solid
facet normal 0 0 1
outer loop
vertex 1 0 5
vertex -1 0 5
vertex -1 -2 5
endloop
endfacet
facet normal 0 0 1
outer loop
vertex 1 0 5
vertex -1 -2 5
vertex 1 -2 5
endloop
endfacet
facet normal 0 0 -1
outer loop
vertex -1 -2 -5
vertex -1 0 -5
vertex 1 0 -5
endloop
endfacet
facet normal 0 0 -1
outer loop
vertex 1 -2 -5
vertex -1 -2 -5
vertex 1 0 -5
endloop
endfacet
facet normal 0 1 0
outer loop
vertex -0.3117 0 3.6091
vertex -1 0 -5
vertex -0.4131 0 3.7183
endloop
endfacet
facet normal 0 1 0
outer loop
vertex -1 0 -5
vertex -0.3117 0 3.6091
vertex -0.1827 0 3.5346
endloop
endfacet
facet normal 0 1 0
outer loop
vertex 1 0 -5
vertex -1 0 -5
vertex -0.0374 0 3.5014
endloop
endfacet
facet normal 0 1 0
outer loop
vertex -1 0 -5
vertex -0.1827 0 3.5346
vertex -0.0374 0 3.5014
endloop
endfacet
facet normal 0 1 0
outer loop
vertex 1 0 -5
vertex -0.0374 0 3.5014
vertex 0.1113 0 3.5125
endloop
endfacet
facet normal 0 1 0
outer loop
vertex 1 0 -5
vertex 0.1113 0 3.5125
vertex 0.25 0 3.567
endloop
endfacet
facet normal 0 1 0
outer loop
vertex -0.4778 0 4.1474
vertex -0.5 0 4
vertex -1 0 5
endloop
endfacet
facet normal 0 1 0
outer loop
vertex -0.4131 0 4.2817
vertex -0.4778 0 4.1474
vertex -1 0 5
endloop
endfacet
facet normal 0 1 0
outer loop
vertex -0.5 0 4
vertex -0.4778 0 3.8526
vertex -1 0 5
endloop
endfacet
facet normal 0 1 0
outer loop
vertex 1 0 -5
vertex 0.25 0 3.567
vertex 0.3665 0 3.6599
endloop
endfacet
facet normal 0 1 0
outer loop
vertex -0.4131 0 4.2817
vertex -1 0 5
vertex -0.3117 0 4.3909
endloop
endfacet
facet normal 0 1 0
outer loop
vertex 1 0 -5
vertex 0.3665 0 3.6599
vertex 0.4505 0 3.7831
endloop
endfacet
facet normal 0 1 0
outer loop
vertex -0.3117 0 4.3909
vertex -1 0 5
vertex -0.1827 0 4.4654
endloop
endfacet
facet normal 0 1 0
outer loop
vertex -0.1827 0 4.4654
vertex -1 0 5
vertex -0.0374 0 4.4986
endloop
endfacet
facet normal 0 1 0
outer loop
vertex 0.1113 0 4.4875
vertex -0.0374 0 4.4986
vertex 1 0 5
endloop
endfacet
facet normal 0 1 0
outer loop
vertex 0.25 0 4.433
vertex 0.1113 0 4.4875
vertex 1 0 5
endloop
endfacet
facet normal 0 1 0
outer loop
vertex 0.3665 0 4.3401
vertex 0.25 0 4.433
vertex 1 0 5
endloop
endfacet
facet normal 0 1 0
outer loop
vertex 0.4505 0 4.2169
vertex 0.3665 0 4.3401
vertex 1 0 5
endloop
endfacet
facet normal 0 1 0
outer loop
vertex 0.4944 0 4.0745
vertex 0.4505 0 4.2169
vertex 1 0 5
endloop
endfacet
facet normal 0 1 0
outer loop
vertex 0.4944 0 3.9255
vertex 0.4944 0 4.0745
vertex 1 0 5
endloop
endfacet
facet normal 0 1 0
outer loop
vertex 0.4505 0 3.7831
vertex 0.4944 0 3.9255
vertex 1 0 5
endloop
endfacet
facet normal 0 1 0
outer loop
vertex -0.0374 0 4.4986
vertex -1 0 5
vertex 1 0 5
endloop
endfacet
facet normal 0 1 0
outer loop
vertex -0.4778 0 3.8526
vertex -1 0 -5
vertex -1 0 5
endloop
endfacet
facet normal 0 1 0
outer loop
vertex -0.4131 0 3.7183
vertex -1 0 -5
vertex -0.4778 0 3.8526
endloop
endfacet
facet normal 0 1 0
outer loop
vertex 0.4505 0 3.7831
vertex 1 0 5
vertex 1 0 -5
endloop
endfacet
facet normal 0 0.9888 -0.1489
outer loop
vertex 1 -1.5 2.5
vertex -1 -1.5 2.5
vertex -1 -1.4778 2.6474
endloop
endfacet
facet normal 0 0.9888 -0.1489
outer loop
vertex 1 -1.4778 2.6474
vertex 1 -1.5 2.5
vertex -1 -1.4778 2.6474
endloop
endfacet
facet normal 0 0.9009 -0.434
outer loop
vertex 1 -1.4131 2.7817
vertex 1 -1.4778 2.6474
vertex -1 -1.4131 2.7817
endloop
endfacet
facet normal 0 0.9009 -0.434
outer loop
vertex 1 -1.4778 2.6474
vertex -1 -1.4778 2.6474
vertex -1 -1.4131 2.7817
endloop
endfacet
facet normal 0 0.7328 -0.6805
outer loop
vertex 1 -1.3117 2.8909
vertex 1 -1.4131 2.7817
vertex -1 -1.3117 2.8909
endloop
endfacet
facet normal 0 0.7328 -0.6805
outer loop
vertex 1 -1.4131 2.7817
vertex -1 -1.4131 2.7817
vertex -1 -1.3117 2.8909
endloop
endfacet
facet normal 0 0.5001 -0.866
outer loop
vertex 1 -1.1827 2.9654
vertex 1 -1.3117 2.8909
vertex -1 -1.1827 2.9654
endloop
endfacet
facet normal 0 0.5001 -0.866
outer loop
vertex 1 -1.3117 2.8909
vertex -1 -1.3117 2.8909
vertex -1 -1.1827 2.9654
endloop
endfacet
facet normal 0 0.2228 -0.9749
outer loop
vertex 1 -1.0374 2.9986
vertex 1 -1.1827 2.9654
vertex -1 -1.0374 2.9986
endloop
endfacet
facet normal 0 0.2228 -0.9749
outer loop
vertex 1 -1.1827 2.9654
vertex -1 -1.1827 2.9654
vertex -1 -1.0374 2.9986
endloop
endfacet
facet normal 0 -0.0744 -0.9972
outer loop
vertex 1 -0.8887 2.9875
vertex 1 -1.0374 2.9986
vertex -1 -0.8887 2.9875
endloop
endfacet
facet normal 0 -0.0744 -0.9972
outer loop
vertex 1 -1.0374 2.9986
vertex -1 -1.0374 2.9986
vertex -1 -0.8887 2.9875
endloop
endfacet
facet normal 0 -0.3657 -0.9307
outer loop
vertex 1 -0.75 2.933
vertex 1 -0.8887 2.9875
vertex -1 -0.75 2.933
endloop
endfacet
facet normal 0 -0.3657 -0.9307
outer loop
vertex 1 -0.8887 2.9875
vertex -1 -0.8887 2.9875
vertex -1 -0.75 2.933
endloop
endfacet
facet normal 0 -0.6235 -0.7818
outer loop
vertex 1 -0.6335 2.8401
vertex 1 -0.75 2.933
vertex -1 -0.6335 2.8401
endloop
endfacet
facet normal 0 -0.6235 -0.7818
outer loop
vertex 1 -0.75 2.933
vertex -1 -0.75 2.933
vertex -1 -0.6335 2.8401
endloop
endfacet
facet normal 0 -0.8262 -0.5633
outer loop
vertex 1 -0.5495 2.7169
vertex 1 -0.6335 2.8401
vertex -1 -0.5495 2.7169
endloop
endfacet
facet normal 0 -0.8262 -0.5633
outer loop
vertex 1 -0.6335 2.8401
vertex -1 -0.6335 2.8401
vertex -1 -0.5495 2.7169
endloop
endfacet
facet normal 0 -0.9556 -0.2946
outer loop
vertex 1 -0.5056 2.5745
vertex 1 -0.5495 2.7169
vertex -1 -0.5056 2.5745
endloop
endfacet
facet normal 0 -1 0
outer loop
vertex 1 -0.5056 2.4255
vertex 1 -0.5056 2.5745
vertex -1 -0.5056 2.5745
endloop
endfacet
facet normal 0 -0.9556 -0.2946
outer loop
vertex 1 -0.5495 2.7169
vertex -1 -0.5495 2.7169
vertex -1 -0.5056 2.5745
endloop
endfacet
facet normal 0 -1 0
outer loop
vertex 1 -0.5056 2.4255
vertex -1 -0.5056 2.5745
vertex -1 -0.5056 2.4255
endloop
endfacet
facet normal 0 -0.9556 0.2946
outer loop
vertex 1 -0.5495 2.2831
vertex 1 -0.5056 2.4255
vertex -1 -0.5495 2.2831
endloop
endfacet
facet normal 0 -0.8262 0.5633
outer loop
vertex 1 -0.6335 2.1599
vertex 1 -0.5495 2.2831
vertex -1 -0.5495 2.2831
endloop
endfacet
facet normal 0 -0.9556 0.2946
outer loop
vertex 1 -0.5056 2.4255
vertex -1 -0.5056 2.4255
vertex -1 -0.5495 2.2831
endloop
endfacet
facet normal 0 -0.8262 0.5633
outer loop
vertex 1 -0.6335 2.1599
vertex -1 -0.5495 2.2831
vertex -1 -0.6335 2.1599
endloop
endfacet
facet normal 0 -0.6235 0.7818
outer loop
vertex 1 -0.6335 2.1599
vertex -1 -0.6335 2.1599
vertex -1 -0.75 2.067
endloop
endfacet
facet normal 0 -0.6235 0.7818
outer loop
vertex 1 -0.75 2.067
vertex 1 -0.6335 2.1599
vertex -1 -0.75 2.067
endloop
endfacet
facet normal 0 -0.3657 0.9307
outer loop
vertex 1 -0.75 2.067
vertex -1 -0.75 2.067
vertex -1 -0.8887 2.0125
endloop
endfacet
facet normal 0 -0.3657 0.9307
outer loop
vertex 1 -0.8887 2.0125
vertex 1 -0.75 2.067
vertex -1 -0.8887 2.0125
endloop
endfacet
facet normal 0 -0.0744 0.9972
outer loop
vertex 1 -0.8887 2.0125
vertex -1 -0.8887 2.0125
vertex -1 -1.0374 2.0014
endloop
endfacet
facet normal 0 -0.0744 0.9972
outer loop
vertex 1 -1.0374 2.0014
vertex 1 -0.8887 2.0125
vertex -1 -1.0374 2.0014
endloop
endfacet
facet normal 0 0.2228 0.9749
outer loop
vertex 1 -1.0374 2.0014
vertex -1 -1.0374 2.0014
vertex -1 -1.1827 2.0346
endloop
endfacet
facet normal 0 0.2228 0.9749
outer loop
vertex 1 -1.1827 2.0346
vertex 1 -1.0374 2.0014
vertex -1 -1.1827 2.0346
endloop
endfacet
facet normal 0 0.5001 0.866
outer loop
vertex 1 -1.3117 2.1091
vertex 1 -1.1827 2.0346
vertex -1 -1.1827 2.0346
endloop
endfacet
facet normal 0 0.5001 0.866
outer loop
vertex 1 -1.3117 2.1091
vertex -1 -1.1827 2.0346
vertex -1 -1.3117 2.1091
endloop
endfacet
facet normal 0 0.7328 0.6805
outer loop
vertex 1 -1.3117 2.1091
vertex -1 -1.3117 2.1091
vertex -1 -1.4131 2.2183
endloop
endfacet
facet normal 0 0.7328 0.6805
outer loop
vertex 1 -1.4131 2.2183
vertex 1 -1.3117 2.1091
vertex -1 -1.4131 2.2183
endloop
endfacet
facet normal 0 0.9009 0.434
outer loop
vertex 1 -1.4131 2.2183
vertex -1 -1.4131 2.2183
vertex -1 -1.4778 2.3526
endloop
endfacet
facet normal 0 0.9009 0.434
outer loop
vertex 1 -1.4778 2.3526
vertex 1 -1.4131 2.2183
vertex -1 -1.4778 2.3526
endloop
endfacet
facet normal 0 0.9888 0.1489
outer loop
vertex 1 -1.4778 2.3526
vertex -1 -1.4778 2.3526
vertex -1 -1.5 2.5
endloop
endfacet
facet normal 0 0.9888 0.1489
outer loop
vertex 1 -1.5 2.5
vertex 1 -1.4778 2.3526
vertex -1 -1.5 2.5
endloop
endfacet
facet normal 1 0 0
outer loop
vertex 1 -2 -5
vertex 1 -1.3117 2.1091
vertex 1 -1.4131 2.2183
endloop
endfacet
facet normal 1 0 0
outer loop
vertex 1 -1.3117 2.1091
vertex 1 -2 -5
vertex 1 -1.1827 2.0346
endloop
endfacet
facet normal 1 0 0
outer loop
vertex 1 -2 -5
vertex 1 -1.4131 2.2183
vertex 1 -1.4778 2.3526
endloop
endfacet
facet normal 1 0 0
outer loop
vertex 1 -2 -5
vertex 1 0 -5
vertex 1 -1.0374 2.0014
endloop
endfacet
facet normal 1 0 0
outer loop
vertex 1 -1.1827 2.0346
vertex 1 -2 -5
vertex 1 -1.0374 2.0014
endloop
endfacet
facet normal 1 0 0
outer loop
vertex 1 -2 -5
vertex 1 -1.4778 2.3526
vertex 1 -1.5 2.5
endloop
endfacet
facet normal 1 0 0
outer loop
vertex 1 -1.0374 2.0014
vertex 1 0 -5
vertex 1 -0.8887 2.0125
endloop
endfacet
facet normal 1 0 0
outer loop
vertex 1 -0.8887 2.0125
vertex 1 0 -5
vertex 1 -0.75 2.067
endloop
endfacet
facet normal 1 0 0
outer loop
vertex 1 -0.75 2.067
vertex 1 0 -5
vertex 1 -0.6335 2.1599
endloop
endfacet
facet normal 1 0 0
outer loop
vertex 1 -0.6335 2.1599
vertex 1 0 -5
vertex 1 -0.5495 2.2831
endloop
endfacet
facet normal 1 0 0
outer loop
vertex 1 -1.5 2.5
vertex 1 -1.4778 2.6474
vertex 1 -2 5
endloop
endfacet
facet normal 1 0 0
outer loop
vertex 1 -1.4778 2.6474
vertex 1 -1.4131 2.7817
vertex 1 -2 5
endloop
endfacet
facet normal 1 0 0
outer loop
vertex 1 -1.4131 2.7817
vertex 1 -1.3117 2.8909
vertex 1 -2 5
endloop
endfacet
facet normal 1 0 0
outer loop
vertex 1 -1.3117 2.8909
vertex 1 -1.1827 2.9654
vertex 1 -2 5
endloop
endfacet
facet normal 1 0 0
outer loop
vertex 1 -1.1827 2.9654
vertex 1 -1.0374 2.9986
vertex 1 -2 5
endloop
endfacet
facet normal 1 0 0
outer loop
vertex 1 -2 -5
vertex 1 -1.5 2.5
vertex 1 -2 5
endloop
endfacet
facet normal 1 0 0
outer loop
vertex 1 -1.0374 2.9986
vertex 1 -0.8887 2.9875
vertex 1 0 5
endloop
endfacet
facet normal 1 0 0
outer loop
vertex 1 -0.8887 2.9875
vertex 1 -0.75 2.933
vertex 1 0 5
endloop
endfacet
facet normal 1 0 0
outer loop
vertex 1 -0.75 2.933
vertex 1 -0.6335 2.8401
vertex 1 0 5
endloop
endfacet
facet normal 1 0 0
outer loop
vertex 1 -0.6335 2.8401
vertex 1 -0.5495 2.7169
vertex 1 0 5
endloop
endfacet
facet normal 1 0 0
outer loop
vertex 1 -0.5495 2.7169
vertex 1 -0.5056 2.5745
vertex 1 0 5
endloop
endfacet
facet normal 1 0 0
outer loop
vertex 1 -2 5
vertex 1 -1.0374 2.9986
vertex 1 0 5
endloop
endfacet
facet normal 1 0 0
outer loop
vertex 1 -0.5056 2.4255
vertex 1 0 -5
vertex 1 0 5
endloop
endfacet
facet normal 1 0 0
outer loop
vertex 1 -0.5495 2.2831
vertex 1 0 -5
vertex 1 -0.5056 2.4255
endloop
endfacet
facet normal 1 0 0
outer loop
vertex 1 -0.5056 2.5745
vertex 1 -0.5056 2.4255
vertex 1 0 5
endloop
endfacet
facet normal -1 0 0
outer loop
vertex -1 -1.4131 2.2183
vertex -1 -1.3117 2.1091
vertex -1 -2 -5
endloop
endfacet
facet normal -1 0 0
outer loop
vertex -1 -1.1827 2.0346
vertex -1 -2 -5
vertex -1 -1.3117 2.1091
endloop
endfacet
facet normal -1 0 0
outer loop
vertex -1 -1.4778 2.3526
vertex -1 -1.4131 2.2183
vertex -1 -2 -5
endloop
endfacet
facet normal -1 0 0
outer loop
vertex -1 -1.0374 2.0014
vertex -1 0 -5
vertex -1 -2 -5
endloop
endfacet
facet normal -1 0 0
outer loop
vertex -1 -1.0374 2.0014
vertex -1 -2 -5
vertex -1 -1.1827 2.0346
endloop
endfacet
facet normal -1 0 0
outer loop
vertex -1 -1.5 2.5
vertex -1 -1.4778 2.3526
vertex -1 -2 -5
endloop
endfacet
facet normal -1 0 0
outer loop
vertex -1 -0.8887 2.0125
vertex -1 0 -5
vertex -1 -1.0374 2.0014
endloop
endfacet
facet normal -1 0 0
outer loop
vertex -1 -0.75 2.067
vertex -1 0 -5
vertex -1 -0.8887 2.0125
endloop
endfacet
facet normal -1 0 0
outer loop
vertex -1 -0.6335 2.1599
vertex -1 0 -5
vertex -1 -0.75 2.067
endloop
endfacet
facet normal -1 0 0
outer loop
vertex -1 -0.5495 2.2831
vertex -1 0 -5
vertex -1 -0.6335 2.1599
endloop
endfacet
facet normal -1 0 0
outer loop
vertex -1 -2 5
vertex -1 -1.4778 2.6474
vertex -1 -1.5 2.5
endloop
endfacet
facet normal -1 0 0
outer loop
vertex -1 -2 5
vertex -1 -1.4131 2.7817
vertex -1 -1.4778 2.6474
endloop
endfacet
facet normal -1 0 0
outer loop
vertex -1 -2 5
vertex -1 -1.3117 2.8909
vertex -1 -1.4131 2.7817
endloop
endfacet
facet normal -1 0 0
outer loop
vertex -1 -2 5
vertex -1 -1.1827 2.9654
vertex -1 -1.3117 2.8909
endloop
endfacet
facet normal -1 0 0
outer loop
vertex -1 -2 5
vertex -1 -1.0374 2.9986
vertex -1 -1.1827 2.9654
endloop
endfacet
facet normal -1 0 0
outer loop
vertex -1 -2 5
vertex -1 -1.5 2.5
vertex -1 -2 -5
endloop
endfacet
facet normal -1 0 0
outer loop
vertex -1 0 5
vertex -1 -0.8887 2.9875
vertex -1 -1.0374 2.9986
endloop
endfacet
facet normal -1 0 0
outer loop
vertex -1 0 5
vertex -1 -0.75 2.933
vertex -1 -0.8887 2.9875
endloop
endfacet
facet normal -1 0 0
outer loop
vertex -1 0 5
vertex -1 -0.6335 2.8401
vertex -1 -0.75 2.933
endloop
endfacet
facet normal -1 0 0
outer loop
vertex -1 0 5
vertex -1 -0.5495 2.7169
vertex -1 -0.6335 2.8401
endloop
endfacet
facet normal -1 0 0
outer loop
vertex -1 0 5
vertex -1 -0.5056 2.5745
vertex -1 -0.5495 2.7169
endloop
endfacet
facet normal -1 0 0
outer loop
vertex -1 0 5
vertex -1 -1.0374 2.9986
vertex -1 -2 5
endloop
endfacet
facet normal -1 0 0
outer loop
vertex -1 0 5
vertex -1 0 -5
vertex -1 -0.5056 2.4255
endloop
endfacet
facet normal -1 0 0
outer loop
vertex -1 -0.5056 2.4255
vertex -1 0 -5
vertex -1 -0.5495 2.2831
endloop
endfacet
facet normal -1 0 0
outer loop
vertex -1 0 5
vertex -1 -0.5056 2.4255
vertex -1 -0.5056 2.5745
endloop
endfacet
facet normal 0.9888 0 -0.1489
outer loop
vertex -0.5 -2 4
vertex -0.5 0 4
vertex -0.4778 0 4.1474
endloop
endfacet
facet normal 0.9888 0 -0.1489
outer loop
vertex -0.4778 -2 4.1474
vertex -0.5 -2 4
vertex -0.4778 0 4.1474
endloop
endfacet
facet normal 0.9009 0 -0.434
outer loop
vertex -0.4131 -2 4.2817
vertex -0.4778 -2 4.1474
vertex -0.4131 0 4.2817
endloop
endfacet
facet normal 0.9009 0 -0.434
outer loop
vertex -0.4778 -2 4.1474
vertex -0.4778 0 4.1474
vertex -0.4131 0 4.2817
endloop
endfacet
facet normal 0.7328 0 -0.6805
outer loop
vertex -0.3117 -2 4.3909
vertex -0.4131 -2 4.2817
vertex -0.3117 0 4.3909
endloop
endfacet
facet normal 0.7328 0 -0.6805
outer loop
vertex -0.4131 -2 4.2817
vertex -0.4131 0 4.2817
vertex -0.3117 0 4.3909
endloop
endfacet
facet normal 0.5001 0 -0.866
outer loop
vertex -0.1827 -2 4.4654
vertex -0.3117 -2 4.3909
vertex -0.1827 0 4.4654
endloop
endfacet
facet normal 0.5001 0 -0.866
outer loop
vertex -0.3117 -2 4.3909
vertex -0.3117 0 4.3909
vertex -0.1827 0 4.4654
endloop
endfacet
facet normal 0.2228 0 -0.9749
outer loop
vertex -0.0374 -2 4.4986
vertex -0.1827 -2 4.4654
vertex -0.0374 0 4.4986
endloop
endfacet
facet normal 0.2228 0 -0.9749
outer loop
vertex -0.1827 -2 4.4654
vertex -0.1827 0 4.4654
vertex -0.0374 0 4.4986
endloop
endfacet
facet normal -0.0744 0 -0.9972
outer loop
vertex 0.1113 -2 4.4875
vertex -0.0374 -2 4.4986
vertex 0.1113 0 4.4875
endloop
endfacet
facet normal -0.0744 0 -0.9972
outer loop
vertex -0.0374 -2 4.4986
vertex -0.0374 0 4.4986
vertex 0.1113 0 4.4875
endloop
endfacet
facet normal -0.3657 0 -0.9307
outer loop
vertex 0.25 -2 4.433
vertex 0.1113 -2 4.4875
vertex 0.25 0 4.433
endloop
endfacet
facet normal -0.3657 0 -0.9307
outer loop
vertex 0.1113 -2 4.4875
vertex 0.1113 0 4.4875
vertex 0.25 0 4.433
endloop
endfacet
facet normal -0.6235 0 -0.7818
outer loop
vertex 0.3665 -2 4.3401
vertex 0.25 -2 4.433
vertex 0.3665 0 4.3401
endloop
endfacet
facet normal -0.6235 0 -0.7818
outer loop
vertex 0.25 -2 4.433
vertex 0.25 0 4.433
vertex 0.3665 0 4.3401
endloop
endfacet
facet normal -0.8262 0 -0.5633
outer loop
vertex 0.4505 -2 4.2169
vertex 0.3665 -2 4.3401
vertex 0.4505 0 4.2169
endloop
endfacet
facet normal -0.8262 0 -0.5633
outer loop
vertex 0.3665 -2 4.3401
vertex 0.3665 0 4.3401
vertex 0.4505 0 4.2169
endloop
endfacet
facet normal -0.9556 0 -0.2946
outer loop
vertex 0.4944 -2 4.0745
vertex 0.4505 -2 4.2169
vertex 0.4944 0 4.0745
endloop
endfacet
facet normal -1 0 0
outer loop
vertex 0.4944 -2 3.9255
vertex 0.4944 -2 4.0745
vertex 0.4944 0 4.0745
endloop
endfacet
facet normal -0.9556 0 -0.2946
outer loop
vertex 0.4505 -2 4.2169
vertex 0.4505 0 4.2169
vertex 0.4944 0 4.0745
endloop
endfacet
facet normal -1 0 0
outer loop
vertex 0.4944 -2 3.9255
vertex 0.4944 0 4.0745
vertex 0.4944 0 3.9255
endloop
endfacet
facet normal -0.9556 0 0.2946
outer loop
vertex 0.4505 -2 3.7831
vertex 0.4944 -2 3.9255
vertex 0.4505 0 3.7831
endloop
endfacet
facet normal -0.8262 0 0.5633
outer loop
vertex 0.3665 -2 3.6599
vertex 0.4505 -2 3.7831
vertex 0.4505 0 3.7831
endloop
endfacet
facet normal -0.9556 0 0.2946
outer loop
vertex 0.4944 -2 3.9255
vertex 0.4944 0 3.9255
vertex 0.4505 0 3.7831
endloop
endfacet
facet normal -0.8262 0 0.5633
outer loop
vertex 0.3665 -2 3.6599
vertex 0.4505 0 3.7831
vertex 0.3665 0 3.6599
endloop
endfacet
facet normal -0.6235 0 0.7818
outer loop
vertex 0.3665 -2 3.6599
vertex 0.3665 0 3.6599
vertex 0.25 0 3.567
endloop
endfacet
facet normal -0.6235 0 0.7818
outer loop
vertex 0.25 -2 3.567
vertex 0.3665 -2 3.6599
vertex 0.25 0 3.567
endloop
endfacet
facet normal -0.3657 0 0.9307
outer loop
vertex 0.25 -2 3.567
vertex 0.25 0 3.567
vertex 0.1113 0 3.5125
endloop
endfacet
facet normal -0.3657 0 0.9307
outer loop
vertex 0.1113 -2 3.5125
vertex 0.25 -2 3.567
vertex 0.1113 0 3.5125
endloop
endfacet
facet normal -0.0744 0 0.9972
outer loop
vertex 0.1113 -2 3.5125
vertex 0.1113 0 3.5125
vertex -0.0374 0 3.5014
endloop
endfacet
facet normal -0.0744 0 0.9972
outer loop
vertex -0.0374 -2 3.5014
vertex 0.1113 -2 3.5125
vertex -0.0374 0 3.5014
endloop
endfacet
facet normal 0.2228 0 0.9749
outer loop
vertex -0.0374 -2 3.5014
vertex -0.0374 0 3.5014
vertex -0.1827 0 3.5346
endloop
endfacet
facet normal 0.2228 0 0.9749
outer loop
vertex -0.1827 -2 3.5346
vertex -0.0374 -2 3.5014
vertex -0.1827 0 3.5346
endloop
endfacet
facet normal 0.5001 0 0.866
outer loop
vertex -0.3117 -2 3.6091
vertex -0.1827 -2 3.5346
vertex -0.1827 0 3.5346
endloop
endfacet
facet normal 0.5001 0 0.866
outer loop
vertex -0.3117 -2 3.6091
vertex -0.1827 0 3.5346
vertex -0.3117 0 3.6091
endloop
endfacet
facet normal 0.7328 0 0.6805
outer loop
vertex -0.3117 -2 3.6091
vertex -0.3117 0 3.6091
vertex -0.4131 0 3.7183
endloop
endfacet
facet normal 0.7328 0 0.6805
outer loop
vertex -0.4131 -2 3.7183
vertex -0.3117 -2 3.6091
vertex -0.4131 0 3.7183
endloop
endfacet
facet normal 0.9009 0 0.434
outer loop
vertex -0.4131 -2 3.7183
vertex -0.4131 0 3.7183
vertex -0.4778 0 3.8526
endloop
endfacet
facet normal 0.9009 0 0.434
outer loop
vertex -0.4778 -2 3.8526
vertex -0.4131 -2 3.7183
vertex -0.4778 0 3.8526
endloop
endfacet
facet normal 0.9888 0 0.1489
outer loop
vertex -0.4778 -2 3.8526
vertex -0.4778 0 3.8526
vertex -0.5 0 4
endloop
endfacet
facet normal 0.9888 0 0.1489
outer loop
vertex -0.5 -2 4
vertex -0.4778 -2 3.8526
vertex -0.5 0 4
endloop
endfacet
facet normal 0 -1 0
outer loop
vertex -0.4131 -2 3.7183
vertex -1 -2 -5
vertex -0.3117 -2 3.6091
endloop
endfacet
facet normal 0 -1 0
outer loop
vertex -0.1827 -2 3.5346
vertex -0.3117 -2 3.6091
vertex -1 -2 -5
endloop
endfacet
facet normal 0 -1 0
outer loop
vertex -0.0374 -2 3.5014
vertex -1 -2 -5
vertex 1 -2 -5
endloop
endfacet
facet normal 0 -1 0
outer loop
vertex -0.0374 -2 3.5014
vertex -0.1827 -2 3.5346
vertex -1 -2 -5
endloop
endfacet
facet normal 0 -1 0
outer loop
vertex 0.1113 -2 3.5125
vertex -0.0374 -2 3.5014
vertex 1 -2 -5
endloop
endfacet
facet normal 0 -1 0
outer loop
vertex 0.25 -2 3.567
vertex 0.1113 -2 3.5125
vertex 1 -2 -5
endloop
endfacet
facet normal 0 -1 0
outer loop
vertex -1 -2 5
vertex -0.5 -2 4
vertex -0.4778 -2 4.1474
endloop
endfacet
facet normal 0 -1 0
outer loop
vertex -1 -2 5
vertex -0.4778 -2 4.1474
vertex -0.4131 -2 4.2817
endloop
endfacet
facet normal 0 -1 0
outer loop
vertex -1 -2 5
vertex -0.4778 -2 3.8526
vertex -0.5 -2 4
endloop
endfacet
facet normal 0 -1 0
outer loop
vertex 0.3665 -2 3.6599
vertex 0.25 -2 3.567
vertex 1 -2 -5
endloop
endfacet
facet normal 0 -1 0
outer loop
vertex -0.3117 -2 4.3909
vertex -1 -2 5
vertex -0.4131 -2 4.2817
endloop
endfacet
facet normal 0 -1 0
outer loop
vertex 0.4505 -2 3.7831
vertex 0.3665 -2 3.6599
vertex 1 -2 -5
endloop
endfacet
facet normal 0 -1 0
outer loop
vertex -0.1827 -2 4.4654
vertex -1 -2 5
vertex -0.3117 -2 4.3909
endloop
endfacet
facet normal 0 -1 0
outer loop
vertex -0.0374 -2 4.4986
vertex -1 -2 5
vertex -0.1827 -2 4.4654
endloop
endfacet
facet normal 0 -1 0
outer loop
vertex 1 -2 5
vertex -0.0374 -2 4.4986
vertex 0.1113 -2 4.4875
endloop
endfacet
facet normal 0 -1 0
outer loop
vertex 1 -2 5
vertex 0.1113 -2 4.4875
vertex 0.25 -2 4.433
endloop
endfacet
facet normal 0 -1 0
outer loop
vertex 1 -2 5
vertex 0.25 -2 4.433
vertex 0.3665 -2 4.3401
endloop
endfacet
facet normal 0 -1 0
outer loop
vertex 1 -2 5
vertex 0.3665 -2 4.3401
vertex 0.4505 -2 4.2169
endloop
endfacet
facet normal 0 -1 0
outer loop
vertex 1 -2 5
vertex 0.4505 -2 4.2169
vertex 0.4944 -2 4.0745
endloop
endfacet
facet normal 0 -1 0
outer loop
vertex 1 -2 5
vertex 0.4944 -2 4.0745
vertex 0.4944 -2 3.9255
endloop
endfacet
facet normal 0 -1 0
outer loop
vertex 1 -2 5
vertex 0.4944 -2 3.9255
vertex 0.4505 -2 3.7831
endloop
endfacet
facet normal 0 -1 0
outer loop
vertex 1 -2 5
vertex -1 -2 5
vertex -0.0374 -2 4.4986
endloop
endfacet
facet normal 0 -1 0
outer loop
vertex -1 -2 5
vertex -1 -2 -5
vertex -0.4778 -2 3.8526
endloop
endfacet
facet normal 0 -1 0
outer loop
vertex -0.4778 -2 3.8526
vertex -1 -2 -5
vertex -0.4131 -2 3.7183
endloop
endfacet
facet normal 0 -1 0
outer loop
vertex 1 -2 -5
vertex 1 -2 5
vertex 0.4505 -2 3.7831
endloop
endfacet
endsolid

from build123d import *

# Parameters (mm, degrees)
F0_W     = 2
F0_H     = 10
F1_DEPTH = 2
F3_D     = 1
F3_DEPTH = 8
F5_D     = 1
F5_DEPTH = 8


with BuildPart() as f1:
    # F0 (on Front) → F1 (new body)
    with BuildSketch(Plane.XZ):
        Rectangle(F0_W, F0_H)
    extrude(amount=F1_DEPTH)

    # F3
    with Locations(Plane.XZ.offset(2)):
        with Locations((0, 4)):
            Hole(F3_D / 2, depth=F3_DEPTH)

    # F5
    with Locations(Plane.YZ.offset(1)):
        with Locations((-1, 2.5)):
            Hole(F5_D / 2, depth=F5_DEPTH)


solid = f1.part
